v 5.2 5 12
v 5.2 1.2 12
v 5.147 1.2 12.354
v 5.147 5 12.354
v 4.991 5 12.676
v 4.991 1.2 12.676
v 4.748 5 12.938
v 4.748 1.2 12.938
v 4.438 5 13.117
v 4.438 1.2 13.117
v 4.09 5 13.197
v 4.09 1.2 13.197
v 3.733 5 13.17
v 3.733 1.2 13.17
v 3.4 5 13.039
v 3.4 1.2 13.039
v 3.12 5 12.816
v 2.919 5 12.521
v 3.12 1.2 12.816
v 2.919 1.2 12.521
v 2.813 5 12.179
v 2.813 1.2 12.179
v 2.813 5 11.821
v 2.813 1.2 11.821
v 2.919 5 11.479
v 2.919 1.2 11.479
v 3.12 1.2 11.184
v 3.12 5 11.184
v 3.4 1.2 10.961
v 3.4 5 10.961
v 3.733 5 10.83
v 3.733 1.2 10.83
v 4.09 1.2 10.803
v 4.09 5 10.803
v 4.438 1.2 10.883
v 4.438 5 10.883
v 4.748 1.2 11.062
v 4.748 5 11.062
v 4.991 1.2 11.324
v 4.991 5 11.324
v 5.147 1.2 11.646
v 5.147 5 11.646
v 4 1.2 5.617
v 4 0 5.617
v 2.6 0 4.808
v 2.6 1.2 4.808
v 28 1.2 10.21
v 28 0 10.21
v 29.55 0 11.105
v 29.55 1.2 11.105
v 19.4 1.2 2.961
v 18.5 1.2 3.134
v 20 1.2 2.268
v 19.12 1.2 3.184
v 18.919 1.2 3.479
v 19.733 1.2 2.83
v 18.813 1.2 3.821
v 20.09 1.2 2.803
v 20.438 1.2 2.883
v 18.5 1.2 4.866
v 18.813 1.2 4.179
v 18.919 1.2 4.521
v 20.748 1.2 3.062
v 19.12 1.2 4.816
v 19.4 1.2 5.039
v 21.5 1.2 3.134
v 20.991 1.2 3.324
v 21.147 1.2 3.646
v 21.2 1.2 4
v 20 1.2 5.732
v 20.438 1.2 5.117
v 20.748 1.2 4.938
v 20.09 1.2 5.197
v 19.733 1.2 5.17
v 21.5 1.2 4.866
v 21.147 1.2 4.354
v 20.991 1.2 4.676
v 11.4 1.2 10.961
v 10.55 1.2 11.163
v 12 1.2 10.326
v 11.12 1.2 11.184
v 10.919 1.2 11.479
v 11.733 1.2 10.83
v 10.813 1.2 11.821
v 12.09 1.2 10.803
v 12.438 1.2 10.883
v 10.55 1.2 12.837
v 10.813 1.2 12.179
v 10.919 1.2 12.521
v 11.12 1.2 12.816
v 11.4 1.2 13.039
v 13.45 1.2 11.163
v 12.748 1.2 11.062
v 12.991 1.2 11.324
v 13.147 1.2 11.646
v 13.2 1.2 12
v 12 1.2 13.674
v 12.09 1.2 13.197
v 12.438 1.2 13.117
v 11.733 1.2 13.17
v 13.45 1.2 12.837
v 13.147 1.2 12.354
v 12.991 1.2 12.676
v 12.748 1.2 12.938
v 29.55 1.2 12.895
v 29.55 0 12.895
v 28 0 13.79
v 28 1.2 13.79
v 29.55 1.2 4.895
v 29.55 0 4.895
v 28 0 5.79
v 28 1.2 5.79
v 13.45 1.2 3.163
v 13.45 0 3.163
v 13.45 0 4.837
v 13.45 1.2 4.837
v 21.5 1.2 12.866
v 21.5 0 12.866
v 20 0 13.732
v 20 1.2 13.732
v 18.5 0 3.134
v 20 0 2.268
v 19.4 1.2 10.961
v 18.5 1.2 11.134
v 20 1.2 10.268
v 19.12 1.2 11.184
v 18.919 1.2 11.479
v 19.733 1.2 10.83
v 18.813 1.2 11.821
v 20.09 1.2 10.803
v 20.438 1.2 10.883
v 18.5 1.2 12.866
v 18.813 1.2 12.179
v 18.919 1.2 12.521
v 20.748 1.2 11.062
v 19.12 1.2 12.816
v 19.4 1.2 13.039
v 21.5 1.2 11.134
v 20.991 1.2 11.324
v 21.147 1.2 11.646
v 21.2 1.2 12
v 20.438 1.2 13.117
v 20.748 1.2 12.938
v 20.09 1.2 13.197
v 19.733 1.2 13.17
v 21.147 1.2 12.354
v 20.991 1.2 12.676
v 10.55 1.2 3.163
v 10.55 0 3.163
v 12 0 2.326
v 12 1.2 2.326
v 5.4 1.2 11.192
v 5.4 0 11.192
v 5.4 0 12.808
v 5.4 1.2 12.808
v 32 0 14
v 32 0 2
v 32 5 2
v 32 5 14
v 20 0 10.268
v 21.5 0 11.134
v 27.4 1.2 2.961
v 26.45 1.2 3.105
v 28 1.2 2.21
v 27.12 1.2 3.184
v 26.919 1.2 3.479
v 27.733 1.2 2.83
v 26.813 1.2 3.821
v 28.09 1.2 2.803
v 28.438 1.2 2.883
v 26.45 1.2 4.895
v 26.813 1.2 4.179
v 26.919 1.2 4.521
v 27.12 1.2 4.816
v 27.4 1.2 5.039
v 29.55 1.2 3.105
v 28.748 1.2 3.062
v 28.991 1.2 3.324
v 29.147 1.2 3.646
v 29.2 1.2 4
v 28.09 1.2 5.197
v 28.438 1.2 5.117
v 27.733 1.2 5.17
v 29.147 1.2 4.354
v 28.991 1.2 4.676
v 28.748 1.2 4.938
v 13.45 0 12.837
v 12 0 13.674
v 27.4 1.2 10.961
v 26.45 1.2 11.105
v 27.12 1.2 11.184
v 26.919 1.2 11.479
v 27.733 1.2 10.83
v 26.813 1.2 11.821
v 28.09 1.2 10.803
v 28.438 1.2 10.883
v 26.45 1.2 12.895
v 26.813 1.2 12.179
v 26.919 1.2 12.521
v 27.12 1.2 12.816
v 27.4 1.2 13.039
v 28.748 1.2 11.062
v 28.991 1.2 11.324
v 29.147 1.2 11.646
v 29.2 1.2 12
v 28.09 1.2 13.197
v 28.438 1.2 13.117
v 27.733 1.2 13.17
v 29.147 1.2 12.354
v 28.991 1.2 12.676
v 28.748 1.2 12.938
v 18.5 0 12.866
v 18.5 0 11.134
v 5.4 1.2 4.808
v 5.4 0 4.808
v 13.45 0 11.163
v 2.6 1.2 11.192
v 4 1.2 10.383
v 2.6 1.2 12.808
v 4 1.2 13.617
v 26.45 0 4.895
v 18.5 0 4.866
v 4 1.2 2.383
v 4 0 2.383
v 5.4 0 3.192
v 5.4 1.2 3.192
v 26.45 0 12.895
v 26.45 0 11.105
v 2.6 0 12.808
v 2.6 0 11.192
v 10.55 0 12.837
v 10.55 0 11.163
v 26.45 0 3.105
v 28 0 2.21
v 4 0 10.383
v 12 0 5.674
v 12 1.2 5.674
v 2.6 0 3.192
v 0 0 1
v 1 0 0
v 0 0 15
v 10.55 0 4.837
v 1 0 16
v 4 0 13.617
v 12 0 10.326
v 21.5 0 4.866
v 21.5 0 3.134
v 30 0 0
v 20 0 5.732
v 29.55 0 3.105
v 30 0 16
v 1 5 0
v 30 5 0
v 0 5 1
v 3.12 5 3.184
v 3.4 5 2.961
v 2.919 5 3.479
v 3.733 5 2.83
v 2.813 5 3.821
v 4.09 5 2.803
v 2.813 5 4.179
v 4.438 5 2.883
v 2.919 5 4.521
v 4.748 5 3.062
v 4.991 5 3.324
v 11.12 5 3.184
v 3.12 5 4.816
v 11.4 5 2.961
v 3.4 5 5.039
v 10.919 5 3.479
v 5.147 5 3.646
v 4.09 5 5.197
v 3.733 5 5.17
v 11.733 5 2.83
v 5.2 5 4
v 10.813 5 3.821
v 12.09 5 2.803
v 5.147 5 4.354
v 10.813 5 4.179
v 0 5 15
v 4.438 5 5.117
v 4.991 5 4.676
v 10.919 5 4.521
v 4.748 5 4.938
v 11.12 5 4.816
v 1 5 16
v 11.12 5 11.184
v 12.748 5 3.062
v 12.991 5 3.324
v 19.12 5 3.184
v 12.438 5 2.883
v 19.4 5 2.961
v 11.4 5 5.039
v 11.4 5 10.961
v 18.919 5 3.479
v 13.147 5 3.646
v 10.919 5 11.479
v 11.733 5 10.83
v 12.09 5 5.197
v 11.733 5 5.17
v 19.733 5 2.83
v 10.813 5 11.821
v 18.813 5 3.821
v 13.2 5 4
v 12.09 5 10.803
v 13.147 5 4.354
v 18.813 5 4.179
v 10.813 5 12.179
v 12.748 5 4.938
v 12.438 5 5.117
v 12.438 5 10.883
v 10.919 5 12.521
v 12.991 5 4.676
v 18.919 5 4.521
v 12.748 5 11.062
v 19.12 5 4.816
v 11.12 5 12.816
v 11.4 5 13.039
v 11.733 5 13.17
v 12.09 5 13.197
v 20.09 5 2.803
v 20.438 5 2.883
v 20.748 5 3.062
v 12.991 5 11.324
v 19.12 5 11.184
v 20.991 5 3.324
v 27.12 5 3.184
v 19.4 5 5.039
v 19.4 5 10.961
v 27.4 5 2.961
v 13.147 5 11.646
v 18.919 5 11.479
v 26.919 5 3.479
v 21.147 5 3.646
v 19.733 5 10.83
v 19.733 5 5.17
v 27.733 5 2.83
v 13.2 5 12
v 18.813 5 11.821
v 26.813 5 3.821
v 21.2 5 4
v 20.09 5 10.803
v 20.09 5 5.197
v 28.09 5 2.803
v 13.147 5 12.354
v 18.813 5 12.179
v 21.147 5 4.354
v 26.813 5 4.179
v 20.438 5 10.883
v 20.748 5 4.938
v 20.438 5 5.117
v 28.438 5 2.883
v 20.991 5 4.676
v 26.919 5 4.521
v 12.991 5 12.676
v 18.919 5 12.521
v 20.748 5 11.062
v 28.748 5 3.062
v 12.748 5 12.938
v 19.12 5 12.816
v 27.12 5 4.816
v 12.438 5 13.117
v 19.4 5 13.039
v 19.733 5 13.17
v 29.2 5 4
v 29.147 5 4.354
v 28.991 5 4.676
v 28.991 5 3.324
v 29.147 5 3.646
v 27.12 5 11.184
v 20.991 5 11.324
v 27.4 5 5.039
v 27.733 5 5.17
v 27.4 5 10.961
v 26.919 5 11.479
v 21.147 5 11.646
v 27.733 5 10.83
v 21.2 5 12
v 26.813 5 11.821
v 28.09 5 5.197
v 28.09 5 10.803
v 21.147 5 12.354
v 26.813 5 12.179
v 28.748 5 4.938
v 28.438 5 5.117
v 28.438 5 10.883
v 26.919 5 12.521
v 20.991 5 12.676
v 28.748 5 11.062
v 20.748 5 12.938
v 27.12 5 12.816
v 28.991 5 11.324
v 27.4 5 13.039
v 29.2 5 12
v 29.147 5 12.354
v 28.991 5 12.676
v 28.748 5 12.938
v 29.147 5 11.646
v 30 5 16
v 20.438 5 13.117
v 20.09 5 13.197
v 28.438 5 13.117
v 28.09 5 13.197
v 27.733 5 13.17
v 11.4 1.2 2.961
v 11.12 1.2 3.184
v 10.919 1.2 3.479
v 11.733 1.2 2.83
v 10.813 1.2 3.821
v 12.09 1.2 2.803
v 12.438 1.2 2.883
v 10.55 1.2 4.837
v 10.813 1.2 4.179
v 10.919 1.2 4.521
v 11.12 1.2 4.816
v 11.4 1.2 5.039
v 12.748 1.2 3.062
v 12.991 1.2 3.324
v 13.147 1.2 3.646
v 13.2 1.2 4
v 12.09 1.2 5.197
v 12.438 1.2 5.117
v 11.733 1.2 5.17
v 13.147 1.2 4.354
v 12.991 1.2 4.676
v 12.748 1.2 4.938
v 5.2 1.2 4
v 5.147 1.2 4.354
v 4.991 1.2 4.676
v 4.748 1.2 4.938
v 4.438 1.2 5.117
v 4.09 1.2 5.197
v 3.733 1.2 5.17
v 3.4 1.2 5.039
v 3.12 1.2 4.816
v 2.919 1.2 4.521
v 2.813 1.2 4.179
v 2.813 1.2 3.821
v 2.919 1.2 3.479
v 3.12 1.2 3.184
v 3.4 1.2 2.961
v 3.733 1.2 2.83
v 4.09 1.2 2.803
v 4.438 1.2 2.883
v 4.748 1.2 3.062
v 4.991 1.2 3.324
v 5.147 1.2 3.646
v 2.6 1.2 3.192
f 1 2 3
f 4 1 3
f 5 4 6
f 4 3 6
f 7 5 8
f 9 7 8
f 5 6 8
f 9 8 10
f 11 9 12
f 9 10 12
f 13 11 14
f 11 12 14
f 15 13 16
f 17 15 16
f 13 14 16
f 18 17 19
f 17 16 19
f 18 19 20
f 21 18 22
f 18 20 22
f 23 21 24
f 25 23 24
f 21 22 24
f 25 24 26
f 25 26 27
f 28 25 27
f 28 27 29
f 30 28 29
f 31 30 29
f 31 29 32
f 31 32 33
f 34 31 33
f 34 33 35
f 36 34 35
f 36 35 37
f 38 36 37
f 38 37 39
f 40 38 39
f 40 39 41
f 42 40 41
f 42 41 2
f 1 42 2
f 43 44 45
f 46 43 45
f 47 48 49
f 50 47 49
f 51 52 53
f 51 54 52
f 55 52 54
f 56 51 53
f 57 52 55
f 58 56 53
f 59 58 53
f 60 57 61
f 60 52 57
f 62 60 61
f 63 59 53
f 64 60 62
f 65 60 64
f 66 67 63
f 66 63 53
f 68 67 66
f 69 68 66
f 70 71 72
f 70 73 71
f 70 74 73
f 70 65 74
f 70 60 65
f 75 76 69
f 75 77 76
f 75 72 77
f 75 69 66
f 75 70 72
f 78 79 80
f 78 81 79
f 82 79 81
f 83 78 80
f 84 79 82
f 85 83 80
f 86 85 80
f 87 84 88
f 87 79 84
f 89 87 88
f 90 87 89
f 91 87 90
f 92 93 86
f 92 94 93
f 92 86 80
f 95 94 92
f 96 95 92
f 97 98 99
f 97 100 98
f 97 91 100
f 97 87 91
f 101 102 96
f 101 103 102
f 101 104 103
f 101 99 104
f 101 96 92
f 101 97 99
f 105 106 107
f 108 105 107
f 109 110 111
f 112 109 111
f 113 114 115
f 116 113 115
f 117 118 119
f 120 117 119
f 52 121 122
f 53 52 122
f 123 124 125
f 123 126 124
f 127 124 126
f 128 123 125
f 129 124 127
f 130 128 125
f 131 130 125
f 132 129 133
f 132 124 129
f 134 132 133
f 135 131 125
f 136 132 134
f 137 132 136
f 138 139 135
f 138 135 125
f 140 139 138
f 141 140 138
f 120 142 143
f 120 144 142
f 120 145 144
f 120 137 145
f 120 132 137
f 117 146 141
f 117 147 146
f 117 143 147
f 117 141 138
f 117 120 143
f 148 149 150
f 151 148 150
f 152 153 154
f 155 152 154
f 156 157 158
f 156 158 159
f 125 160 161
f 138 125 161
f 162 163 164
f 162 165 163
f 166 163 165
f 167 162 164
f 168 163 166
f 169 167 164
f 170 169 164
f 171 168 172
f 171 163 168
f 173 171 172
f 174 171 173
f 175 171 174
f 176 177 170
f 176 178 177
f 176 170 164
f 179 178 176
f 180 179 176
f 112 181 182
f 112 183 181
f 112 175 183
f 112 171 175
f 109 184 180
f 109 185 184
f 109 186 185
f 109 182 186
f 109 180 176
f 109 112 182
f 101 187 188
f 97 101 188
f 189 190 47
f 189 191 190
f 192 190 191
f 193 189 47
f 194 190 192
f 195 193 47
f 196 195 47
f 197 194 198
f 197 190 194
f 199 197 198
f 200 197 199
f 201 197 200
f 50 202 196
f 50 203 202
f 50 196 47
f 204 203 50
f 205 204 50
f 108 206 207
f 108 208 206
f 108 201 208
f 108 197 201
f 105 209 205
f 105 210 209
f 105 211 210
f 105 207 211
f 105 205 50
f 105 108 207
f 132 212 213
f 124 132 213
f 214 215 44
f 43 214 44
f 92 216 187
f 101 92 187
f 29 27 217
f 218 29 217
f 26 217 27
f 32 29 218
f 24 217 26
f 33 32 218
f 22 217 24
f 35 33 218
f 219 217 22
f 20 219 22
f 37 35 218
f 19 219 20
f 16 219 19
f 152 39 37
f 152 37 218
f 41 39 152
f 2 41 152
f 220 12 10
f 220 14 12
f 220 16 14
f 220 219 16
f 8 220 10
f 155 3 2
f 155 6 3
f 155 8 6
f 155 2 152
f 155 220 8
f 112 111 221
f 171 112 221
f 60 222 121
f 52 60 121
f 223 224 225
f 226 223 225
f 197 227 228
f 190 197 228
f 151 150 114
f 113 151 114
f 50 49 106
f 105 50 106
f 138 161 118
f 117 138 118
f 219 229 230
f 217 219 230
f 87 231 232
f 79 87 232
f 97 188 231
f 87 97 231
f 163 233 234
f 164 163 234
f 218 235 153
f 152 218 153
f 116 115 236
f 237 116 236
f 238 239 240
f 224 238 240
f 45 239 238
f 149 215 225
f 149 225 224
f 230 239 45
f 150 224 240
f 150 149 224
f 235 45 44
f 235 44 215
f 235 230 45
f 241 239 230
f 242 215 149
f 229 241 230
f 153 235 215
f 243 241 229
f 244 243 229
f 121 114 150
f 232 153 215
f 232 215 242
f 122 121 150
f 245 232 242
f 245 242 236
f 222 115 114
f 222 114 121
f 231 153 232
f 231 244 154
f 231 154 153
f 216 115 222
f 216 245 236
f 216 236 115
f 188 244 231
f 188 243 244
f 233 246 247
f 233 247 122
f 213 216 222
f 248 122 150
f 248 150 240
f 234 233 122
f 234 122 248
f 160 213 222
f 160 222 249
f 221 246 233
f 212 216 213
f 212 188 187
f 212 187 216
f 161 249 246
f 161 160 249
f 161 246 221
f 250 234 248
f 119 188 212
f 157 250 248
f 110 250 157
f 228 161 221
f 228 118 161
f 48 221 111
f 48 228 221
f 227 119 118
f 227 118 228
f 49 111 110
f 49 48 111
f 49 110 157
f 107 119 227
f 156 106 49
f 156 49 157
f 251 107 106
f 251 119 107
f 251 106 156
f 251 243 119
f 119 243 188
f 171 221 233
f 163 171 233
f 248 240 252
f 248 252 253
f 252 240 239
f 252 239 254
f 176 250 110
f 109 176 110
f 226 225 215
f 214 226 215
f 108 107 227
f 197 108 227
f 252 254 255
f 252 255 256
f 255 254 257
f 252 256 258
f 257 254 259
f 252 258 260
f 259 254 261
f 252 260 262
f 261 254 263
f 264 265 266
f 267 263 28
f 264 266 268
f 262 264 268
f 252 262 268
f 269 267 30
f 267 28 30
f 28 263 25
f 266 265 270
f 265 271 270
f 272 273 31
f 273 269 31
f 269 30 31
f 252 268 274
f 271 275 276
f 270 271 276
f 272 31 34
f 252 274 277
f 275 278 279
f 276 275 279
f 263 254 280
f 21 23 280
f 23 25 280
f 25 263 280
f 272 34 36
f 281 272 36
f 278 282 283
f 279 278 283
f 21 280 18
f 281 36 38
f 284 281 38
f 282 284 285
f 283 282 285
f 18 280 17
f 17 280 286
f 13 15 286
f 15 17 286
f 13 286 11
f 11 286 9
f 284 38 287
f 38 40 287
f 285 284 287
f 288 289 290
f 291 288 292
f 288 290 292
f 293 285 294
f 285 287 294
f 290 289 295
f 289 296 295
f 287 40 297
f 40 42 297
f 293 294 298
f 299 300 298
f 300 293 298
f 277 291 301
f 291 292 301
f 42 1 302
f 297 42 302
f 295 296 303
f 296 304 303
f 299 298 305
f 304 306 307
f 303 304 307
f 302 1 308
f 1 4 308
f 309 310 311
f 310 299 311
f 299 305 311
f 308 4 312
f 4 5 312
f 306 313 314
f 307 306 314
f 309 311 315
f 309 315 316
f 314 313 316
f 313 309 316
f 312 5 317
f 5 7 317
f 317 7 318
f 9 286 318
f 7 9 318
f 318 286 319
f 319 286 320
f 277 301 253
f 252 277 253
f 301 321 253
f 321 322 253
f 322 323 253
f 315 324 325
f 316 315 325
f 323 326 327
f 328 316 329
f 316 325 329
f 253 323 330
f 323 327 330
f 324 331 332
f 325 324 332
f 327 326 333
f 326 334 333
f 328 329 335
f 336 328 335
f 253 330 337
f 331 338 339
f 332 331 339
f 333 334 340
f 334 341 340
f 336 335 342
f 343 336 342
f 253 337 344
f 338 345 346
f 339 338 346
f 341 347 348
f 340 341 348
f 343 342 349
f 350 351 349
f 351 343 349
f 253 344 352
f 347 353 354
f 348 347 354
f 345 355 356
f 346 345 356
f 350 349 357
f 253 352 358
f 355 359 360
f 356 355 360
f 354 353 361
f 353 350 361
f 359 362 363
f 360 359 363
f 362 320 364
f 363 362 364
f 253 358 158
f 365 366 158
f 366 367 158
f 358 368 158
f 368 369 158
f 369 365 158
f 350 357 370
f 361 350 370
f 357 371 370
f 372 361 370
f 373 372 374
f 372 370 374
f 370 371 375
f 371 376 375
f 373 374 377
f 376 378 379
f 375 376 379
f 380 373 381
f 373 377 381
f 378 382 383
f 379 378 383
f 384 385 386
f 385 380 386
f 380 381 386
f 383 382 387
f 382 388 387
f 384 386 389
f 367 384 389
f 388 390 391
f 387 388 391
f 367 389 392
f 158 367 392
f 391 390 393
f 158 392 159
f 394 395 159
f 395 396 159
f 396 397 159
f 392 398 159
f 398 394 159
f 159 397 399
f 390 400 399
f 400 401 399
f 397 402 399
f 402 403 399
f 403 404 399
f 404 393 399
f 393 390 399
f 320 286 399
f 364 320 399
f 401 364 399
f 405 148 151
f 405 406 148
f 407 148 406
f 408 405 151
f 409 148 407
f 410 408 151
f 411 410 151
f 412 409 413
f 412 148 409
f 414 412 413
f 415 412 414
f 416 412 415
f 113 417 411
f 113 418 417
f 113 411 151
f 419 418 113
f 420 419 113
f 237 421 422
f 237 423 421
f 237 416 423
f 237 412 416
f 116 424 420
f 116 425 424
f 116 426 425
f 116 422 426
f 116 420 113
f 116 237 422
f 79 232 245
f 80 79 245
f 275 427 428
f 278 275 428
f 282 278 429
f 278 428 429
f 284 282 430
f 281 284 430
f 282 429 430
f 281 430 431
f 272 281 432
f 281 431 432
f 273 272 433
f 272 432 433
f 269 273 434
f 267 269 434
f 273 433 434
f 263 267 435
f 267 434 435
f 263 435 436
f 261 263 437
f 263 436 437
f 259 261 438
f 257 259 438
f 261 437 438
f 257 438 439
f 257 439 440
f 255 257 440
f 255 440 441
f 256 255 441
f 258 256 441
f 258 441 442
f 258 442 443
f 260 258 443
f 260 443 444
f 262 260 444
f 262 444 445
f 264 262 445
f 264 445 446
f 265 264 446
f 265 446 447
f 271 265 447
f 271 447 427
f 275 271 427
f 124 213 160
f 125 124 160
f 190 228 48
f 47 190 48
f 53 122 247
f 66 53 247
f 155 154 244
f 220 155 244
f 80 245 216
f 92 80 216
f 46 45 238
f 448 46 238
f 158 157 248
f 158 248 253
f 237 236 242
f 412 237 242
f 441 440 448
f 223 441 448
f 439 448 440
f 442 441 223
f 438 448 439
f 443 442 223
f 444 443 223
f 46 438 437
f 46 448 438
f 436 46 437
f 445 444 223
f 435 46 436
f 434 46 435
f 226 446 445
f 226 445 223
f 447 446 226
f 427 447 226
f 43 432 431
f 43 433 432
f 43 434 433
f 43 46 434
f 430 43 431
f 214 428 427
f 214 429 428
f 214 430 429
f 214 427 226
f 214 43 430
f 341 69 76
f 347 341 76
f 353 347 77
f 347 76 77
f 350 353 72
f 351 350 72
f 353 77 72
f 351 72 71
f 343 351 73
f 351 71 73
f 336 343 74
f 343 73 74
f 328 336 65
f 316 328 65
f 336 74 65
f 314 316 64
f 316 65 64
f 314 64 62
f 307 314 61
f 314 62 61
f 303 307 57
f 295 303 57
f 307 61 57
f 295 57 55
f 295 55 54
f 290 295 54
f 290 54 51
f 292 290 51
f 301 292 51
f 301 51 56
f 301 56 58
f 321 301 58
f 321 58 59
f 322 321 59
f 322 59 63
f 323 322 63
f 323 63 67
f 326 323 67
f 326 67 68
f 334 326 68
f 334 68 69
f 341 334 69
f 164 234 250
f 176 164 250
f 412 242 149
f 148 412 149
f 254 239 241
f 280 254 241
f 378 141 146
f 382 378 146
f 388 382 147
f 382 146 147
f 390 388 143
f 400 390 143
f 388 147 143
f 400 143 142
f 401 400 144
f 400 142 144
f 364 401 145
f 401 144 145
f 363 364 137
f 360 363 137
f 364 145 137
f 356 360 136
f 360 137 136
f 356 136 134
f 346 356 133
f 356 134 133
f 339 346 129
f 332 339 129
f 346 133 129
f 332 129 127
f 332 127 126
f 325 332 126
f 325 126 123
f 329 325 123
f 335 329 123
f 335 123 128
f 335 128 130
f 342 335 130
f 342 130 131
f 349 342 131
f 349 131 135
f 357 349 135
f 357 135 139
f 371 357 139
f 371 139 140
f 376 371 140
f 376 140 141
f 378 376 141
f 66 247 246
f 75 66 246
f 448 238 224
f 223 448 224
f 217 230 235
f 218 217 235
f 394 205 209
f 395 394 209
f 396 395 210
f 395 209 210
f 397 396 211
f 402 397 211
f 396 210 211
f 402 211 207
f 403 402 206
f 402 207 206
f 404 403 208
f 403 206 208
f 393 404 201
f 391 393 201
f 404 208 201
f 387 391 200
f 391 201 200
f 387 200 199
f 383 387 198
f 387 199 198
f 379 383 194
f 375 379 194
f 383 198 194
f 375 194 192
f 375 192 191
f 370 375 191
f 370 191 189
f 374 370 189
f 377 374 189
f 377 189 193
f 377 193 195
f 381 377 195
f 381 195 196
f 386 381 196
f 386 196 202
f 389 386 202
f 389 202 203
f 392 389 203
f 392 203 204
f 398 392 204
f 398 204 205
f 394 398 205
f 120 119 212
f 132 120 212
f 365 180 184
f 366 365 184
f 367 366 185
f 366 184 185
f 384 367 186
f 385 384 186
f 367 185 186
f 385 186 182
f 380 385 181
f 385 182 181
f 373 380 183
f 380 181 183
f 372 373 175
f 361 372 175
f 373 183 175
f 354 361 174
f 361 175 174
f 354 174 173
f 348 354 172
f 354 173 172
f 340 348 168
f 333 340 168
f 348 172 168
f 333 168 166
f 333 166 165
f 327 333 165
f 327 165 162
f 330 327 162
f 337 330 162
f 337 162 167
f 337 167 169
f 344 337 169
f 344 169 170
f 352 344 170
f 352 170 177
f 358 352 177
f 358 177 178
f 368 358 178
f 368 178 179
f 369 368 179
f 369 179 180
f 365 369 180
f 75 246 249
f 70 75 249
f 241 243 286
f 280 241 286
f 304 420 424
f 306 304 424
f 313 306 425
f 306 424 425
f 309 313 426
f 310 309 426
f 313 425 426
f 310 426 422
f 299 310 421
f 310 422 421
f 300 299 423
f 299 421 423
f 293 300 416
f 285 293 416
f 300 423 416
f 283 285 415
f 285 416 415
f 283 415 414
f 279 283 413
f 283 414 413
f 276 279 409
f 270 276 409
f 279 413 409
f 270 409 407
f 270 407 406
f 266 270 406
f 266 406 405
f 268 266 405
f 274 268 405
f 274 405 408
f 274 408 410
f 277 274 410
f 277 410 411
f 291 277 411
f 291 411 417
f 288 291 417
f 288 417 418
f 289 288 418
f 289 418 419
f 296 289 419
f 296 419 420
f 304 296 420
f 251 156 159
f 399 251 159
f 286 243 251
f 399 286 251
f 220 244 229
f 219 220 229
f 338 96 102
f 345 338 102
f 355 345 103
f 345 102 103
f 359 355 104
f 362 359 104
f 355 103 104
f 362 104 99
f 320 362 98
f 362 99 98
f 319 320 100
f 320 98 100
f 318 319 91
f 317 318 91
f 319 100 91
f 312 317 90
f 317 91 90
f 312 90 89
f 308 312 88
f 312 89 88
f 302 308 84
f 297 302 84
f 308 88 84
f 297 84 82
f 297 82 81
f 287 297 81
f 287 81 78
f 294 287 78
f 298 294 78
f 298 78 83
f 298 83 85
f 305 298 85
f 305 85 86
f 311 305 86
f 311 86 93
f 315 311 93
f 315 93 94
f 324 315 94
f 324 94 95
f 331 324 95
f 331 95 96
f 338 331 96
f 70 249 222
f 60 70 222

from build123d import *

# Parameters (mm, degrees)
SKETCH_W                    = 32
SKETCH_H                    = 16
PAD_DEPTH                   = 5
SKETCH001_R                 = 1.2
HOLE_DEPTH                  = 77.250567
SKETCH001_LINEARPATTERN_2_R = 1.2
HOLE_LINEARPATTERN_2_DEPTH  = 77.250567
SKETCH001_LINEARPATTERN_3_R = 1.2
HOLE_LINEARPATTERN_3_DEPTH  = 77.250567
SKETCH001_LINEARPATTERN_4_R = 1.2
HOLE_LINEARPATTERN_4_DEPTH  = 77.250567
LINEARPATTERN001_COUNT      = 2
LINEARPATTERN001_PITCH      = 8
POCKET_DEPTH                = 1.2
LINEARPATTERN002_COUNT      = 2
LINEARPATTERN002_PITCH      = 8
CHAMFER_SIZE                = 1
CHAMFER001_SIZE             = 2


with BuildPart() as part:
    # Sketch → Pad (new body)
    with BuildSketch(Plane.XZ):
        with Locations((16, 8)):
            Rectangle(SKETCH_W, SKETCH_H)
    extrude(amount=-PAD_DEPTH)

    # Sketch001 (on Face5 of Pad) → Hole (cut, through all)
    with BuildSketch(Plane.XZ):
        with Locations((4, 4)):
            Circle(SKETCH001_R)
    hole = extrude(amount=-HOLE_DEPTH, mode=Mode.SUBTRACT)

    # Sketch001 LinearPattern 2 → Hole LinearPattern 2 (cut, through all)
    with BuildSketch(Plane(origin=(8, 0, 0), x_dir=(1, 0, 0), z_dir=(0, -1, 0))):
        with Locations((4, 4)):
            Circle(SKETCH001_LINEARPATTERN_2_R)
    hole_linearpattern_2 = extrude(amount=-HOLE_LINEARPATTERN_2_DEPTH, mode=Mode.SUBTRACT)

    # Sketch001 LinearPattern 3 → Hole LinearPattern 3 (cut, through all)
    with BuildSketch(Plane(origin=(16, 0, 0), x_dir=(1, 0, 0), z_dir=(0, -1, 0))):
        with Locations((4, 4)):
            Circle(SKETCH001_LINEARPATTERN_3_R)
    hole_linearpattern_3 = extrude(amount=-HOLE_LINEARPATTERN_3_DEPTH, mode=Mode.SUBTRACT)

    # Sketch001 LinearPattern 4 → Hole LinearPattern 4 (cut, through all)
    with BuildSketch(Plane(origin=(24, 0, 0), x_dir=(1, 0, 0), z_dir=(0, -1, 0))):
        with Locations((4, 4)):
            Circle(SKETCH001_LINEARPATTERN_4_R)
    hole_linearpattern_4 = extrude(amount=-HOLE_LINEARPATTERN_4_DEPTH, mode=Mode.SUBTRACT)

    # LinearPattern001: Hole, Hole LinearPattern 2, Hole LinearPattern 3, Hole LinearPattern 4 ×2
    with Locations(*[(0, 0, i * LINEARPATTERN001_PITCH) for i in range(1, LINEARPATTERN001_COUNT)]):
        add(hole, mode=Mode.SUBTRACT)
        add(hole_linearpattern_2, mode=Mode.SUBTRACT)
        add(hole_linearpattern_3, mode=Mode.SUBTRACT)
        add(hole_linearpattern_4, mode=Mode.SUBTRACT)

    # Sketch002 (on Face4 of MultiTransform) → Pocket (cut)
    with BuildSketch(Plane.XZ):
        Polygon((4, 5.616581), (2.6, 4.80829), (2.6, 3.19171), (4, 2.383419), (5.4, 3.19171), (5.4, 4.80829), align=None)
        Polygon((12, 5.674316), (10.55, 4.837158), (10.55, 3.162842), (12, 2.325684), (13.45, 3.162842), (13.45, 4.837158), align=None)
        Polygon((20, 5.732051), (18.5, 4.866025), (18.5, 3.133975), (20, 2.267949), (21.5, 3.133975), (21.5, 4.866025), align=None)
        Polygon((28, 5.789786), (26.45, 4.894893), (26.45, 3.105107), (28, 2.210214), (29.55, 3.105107), (29.55, 4.894893), align=None)
    pocket = extrude(amount=-POCKET_DEPTH, mode=Mode.SUBTRACT)

    # LinearPattern002: Pocket ×2
    with Locations(*[(0, 0, i * LINEARPATTERN002_PITCH) for i in range(1, LINEARPATTERN002_COUNT)]):
        add(pocket, mode=Mode.SUBTRACT)

    # Chamfer
    chamfer_edges = [part.edges().sort_by_distance(p)[0] for p in [
        (0, 2.5, 16),
        (0, 2.5, 0),
    ]]
    chamfer(chamfer_edges, length=CHAMFER_SIZE)

    # Chamfer001
    chamfer001_edges = [part.edges().sort_by_distance(p)[0] for p in [
        (32, 2.5, 16),
        (32, 2.5, 0),
    ]]
    chamfer(chamfer001_edges, length=CHAMFER001_SIZE)


solid = part.part
